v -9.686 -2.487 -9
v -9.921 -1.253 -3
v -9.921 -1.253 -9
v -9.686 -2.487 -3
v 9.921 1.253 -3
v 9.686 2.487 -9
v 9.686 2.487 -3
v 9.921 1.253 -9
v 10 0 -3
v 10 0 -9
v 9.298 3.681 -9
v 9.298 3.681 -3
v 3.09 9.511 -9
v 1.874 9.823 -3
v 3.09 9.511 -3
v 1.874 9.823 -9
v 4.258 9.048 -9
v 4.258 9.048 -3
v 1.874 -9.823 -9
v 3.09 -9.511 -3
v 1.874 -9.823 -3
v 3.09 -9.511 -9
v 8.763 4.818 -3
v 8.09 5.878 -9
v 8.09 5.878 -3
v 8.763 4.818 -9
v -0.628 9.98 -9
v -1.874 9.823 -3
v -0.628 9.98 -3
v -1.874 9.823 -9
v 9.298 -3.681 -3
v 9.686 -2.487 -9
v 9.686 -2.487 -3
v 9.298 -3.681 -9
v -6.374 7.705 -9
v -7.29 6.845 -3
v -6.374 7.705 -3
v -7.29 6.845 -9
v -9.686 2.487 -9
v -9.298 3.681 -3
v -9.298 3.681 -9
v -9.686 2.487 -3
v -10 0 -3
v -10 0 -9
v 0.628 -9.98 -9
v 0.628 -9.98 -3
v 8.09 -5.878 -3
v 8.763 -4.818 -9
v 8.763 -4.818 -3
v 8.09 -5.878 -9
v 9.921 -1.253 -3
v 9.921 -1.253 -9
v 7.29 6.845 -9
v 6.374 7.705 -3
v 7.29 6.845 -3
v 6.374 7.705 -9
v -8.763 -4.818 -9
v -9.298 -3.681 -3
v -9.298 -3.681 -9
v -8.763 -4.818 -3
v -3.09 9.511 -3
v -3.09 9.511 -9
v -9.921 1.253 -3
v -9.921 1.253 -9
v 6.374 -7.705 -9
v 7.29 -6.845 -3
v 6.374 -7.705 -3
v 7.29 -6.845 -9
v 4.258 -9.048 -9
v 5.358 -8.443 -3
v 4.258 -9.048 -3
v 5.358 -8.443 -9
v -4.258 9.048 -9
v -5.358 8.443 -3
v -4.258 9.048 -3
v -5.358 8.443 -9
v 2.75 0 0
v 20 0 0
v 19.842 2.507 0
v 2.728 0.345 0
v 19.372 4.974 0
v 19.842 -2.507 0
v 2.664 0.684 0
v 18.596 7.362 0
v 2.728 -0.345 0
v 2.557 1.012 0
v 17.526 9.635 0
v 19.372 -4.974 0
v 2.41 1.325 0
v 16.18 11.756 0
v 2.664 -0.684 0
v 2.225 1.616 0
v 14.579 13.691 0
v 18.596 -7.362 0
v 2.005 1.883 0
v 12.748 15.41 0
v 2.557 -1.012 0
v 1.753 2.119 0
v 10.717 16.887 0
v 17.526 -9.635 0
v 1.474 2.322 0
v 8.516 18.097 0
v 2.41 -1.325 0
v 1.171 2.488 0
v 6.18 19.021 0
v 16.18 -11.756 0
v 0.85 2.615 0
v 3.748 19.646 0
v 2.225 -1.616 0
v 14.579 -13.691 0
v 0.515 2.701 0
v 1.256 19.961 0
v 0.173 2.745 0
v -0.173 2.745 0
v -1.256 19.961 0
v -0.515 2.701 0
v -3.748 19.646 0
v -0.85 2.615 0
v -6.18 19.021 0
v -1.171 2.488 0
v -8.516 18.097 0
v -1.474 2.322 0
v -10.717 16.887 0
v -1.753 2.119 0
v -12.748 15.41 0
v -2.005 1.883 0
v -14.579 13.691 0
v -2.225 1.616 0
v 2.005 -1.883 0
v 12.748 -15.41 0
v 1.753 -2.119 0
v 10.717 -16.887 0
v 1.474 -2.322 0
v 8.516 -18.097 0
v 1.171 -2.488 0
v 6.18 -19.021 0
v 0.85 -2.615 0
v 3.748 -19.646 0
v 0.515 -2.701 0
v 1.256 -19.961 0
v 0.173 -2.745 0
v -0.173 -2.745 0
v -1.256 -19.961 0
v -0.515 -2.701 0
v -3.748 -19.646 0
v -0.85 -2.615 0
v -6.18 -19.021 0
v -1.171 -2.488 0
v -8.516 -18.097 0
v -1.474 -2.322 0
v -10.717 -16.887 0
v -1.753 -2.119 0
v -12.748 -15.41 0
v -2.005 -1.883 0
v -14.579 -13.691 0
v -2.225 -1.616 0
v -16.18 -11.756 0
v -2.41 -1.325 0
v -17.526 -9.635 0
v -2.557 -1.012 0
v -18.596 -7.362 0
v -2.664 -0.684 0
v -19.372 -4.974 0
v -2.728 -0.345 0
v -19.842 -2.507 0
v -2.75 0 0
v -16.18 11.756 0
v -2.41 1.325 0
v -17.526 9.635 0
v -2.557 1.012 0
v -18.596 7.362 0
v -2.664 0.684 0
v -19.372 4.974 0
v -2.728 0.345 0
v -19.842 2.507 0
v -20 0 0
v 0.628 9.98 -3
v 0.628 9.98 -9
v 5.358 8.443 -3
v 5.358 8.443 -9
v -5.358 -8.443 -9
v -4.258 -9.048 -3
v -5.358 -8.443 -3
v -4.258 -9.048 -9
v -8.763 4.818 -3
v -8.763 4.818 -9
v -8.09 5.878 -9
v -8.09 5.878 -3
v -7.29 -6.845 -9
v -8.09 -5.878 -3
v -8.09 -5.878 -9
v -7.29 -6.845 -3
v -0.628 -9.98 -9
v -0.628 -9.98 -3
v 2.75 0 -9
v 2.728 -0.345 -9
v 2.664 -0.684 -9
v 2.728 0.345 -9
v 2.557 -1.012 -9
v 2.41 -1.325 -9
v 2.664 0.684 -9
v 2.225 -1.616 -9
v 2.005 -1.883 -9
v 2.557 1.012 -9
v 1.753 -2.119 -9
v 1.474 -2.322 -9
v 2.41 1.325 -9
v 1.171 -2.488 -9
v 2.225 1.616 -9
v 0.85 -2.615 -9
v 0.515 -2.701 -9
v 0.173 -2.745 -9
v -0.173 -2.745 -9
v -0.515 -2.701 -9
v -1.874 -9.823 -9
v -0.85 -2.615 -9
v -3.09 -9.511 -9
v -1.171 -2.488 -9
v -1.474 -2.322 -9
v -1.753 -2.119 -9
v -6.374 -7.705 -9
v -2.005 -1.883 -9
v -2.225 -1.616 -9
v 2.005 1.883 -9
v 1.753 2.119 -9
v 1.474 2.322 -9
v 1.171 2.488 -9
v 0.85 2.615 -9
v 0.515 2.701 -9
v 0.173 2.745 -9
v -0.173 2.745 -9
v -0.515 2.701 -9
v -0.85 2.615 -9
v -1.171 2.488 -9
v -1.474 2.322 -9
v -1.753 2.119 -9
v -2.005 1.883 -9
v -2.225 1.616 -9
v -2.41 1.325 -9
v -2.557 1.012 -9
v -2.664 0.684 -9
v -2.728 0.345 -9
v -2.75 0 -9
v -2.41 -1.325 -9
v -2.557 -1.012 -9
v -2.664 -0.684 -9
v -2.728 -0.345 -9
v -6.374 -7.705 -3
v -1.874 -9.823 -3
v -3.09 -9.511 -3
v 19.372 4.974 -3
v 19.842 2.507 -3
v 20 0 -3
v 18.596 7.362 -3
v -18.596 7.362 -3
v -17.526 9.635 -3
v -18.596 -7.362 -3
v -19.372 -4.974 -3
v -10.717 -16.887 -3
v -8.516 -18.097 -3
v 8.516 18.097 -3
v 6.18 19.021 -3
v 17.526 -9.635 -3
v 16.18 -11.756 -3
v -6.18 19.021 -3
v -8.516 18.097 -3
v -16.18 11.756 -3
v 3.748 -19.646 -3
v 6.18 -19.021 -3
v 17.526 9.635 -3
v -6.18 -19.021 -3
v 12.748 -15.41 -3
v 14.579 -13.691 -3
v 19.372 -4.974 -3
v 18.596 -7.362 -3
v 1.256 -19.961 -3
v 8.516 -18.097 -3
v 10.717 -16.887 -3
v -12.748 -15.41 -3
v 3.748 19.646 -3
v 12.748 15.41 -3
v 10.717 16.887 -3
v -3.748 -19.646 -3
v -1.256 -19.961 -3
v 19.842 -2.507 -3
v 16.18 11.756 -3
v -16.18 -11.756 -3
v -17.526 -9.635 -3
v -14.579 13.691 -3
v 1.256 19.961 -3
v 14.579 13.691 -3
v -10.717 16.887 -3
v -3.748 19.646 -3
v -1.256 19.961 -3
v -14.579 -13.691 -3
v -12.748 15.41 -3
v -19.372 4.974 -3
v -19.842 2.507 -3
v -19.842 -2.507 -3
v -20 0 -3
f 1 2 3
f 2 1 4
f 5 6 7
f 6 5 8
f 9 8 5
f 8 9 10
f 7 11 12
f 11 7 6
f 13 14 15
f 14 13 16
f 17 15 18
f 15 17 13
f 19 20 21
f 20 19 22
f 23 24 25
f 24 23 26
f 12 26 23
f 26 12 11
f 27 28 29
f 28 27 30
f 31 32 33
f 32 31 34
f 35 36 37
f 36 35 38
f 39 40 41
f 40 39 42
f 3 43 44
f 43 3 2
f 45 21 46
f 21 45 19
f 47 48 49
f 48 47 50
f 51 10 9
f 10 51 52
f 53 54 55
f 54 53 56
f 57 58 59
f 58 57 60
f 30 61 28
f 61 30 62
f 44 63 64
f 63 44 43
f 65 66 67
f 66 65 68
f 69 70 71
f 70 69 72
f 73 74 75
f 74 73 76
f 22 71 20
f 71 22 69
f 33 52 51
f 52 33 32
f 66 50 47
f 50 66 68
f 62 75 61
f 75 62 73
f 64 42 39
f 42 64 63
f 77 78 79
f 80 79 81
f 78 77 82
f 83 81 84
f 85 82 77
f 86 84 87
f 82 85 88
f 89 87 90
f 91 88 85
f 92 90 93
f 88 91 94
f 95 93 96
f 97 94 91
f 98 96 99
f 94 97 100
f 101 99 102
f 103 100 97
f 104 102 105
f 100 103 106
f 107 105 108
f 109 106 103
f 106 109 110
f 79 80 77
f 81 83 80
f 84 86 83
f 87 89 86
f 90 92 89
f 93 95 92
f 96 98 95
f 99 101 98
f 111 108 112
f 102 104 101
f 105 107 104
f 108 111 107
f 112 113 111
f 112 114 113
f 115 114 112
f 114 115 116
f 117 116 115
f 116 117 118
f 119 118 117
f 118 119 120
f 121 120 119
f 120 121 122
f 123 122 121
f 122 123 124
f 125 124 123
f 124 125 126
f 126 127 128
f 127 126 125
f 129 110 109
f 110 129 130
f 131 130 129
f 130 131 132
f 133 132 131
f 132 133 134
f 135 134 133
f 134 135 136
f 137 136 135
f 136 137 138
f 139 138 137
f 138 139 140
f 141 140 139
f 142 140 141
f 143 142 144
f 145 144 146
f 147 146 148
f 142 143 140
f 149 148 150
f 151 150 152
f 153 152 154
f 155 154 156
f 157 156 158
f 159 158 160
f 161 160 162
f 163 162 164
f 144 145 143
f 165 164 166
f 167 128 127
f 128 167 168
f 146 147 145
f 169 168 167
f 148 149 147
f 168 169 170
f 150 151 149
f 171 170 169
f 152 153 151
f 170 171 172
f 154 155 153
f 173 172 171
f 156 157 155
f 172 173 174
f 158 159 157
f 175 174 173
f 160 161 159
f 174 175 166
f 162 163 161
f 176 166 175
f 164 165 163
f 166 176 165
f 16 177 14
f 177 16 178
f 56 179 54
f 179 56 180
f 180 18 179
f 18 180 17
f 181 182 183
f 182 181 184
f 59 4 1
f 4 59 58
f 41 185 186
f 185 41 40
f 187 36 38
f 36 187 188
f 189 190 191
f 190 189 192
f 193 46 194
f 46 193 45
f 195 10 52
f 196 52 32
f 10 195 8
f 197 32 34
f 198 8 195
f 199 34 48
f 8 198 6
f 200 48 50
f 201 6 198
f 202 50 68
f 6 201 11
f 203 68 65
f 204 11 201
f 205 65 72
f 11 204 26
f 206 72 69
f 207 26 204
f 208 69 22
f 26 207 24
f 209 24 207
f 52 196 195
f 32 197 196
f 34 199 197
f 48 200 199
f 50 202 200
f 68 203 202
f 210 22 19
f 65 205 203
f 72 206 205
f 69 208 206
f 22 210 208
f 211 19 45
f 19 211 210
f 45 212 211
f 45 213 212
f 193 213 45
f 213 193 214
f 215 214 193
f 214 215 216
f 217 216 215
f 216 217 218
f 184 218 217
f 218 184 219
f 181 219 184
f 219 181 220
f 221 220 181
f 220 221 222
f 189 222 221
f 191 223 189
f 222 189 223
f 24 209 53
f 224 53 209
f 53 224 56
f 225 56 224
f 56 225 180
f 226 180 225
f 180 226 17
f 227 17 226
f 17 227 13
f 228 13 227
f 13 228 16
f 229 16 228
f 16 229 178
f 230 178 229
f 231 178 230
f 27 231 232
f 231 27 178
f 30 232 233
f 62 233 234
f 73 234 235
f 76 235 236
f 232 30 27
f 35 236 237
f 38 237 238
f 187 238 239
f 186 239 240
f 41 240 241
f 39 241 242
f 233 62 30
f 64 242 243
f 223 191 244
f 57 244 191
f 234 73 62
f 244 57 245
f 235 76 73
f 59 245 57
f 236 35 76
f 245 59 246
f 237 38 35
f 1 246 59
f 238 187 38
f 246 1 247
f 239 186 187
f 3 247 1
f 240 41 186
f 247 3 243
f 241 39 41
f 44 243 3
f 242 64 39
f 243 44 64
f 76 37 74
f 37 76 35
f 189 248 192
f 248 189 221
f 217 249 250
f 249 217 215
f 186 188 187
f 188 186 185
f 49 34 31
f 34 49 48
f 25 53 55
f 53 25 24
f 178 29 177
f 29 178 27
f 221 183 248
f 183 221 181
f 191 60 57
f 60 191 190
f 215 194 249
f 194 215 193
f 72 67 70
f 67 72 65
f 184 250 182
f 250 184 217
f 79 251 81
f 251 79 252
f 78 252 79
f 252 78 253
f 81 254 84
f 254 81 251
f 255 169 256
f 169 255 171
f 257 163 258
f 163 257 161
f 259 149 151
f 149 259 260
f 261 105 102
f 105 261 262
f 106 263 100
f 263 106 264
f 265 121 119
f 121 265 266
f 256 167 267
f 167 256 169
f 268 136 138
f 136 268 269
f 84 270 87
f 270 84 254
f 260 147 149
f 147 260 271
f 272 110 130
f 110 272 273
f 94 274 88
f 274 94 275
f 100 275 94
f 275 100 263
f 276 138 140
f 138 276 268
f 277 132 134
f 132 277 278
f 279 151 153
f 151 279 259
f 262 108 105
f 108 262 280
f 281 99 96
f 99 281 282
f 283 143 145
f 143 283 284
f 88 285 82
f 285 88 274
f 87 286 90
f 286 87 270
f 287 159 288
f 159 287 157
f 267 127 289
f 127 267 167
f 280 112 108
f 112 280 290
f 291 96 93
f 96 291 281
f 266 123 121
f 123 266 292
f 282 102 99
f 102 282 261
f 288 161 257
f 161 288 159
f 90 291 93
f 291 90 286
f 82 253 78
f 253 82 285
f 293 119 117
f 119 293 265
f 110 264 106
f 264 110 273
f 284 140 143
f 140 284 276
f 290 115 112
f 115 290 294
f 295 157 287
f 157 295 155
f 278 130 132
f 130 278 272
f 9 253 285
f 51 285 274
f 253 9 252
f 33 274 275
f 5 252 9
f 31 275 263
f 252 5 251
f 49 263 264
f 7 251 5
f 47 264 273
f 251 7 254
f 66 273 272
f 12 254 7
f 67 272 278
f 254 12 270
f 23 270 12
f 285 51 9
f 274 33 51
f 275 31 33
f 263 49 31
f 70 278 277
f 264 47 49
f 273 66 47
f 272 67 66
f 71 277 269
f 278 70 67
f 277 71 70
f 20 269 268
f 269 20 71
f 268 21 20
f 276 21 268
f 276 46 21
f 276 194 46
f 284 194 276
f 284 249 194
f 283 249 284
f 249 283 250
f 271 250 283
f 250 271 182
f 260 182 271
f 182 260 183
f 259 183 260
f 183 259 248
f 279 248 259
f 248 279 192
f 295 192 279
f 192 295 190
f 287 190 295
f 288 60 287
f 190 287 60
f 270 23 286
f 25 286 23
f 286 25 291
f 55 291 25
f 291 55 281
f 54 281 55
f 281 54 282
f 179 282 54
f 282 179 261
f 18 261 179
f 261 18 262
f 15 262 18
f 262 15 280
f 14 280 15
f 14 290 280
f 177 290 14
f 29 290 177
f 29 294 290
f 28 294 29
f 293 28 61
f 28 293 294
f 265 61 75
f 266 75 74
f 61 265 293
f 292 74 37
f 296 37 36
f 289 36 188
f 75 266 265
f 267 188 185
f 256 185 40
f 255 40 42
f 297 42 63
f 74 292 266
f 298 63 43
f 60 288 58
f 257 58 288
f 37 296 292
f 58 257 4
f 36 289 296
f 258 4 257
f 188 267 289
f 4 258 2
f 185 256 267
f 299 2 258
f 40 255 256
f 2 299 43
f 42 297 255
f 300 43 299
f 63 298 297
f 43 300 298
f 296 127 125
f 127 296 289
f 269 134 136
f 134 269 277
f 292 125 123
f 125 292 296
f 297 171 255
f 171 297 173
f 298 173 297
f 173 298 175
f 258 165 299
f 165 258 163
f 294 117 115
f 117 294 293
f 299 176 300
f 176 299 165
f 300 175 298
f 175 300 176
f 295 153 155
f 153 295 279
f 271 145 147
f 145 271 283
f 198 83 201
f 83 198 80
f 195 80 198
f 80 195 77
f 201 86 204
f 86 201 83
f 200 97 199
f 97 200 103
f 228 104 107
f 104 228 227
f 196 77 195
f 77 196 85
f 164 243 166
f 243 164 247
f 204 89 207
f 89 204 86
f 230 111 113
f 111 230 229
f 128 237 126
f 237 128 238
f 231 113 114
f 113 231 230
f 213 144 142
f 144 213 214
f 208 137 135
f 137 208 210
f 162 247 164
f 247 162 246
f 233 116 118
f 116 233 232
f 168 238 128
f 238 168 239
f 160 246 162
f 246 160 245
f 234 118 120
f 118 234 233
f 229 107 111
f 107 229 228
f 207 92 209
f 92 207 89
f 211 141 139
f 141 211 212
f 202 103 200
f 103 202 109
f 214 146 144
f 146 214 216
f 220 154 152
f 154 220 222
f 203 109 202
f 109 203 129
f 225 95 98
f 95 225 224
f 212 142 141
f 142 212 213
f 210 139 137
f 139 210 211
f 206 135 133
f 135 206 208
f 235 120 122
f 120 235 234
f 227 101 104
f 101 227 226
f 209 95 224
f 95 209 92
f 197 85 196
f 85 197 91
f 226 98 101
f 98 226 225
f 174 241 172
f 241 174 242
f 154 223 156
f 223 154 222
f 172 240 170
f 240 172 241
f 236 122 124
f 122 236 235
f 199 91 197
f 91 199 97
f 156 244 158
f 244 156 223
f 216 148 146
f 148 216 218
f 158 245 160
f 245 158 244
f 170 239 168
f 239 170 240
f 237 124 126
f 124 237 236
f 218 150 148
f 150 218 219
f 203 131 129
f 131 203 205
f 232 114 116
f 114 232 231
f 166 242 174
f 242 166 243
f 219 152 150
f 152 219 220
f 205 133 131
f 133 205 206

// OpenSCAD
$fn = 50;


difference() {
	union() {
		translate(v = [0, 0, -9.0000000000]) {
			cylinder(h = 9, r = 10.0000000000);
		}
		translate(v = [0, 0, -3.0000000000]) {
			cylinder(h = 3, r = 20.0000000000);
		}
	}
	union() {
		#translate(v = [0, 0, -9]) {
			cylinder(h = 9, r = 2.7500000000);
		}
	}
}
